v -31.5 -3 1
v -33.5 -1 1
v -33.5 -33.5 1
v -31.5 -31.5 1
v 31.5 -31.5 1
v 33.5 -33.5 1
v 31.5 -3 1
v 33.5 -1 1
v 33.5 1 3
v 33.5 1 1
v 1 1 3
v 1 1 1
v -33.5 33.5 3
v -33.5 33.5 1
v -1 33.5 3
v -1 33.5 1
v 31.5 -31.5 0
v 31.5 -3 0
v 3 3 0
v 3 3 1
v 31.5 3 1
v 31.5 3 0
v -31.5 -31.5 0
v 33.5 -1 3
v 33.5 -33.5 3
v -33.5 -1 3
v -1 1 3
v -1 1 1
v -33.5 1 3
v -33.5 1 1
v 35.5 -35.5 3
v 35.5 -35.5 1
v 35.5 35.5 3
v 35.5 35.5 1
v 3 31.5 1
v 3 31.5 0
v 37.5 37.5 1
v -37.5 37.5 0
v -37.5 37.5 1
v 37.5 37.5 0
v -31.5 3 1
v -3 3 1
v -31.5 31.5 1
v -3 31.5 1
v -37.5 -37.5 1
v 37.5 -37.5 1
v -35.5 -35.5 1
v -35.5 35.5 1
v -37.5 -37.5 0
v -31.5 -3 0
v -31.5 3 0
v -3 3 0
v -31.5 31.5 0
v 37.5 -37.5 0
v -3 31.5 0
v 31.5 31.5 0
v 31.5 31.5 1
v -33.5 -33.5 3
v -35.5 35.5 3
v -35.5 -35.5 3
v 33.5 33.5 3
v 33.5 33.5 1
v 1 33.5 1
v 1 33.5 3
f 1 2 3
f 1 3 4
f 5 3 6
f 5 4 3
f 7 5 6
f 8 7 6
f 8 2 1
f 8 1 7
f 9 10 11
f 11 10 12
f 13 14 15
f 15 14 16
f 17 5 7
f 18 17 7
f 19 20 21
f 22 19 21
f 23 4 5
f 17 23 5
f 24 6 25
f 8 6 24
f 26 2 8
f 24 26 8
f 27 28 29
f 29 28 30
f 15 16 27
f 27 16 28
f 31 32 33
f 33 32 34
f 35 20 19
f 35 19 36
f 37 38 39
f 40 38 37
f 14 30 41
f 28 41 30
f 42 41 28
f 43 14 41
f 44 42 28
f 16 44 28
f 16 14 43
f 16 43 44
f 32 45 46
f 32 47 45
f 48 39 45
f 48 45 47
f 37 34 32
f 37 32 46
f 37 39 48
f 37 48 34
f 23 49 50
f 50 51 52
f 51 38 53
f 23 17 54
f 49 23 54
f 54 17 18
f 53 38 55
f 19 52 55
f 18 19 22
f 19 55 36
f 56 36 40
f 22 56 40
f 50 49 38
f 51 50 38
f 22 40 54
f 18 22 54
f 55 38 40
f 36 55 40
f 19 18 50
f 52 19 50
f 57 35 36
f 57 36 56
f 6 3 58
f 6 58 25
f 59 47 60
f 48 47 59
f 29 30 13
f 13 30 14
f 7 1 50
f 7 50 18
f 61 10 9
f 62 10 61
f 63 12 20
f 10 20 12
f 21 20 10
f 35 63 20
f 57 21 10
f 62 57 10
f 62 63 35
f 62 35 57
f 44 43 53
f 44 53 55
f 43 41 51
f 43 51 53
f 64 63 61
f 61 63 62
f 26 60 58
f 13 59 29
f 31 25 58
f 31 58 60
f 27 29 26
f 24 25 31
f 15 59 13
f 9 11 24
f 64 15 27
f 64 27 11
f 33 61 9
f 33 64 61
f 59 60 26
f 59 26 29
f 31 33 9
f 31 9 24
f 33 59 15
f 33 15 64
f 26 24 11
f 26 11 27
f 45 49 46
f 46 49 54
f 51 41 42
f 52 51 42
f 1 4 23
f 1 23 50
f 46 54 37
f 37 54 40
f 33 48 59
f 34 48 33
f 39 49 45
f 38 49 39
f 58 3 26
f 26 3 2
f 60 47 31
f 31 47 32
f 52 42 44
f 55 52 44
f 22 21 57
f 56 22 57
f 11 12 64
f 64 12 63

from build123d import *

# Parameters (mm, degrees)
ESBO_O1_W                = 75
ESBO_O1_H                = 75
RESSALTO_EXTRUS_O1_DEPTH = 1
ESBO_O2_W                = 71
ESBO_O2_H                = 71
ESBO_O2_W_2              = 67
ESBO_O2_H_2              = 67
RESSALTO_EXTRUS_O2_DEPTH = 2
ESBO_O3_W                = 28.5
ESBO_O3_H                = 28.5
ESBO_O3_W_2              = 63
CORTE_EXTRUS_O2_DEPTH    = 3
RESSALTO_EXTRUS_O3_DEPTH = 2


with BuildPart() as part:
    # Esboço1 → Ressalto-extrusão1 (new body)
    with BuildSketch(Plane.XY):
        Rectangle(ESBO_O1_W, ESBO_O1_H)
    extrude(amount=RESSALTO_EXTRUS_O1_DEPTH)

    # Esboço2 → Ressalto-extrusão2 (add)
    with BuildSketch(Plane.XY.offset(1)):
        Rectangle(ESBO_O2_W, ESBO_O2_H)
        Rectangle(ESBO_O2_W_2, ESBO_O2_H_2, mode=Mode.SUBTRACT)
    extrude(amount=RESSALTO_EXTRUS_O2_DEPTH)

    # Esboço3 → Corte-extrusão2 (cut)
    with BuildSketch(Plane.XY.offset(1)):
        with Locations((17.25, 17.25)):
            Rectangle(ESBO_O3_W, ESBO_O3_H)
        with Locations((0, -17.25)):
            Rectangle(ESBO_O3_W_2, ESBO_O3_H)
        with Locations((-17.25, 17.25)):
            Rectangle(ESBO_O3_W, ESBO_O3_H)
    extrude(amount=-CORTE_EXTRUS_O2_DEPTH, mode=Mode.SUBTRACT)

    # Esboço4 → Ressalto-extrusão3 (add)
    with BuildSketch(Plane.XY.offset(1)):
        Polygon((0, 33.5), (-1, 33.5), (-1, 1), (-33.5, 1), (-33.5, 0), (-33.5, -1), (33.5, -1), (33.5, 0), (33.5, 1), (1, 1), (1, 33.5), align=None)
    extrude(amount=RESSALTO_EXTRUS_O3_DEPTH)


solid = part.part
